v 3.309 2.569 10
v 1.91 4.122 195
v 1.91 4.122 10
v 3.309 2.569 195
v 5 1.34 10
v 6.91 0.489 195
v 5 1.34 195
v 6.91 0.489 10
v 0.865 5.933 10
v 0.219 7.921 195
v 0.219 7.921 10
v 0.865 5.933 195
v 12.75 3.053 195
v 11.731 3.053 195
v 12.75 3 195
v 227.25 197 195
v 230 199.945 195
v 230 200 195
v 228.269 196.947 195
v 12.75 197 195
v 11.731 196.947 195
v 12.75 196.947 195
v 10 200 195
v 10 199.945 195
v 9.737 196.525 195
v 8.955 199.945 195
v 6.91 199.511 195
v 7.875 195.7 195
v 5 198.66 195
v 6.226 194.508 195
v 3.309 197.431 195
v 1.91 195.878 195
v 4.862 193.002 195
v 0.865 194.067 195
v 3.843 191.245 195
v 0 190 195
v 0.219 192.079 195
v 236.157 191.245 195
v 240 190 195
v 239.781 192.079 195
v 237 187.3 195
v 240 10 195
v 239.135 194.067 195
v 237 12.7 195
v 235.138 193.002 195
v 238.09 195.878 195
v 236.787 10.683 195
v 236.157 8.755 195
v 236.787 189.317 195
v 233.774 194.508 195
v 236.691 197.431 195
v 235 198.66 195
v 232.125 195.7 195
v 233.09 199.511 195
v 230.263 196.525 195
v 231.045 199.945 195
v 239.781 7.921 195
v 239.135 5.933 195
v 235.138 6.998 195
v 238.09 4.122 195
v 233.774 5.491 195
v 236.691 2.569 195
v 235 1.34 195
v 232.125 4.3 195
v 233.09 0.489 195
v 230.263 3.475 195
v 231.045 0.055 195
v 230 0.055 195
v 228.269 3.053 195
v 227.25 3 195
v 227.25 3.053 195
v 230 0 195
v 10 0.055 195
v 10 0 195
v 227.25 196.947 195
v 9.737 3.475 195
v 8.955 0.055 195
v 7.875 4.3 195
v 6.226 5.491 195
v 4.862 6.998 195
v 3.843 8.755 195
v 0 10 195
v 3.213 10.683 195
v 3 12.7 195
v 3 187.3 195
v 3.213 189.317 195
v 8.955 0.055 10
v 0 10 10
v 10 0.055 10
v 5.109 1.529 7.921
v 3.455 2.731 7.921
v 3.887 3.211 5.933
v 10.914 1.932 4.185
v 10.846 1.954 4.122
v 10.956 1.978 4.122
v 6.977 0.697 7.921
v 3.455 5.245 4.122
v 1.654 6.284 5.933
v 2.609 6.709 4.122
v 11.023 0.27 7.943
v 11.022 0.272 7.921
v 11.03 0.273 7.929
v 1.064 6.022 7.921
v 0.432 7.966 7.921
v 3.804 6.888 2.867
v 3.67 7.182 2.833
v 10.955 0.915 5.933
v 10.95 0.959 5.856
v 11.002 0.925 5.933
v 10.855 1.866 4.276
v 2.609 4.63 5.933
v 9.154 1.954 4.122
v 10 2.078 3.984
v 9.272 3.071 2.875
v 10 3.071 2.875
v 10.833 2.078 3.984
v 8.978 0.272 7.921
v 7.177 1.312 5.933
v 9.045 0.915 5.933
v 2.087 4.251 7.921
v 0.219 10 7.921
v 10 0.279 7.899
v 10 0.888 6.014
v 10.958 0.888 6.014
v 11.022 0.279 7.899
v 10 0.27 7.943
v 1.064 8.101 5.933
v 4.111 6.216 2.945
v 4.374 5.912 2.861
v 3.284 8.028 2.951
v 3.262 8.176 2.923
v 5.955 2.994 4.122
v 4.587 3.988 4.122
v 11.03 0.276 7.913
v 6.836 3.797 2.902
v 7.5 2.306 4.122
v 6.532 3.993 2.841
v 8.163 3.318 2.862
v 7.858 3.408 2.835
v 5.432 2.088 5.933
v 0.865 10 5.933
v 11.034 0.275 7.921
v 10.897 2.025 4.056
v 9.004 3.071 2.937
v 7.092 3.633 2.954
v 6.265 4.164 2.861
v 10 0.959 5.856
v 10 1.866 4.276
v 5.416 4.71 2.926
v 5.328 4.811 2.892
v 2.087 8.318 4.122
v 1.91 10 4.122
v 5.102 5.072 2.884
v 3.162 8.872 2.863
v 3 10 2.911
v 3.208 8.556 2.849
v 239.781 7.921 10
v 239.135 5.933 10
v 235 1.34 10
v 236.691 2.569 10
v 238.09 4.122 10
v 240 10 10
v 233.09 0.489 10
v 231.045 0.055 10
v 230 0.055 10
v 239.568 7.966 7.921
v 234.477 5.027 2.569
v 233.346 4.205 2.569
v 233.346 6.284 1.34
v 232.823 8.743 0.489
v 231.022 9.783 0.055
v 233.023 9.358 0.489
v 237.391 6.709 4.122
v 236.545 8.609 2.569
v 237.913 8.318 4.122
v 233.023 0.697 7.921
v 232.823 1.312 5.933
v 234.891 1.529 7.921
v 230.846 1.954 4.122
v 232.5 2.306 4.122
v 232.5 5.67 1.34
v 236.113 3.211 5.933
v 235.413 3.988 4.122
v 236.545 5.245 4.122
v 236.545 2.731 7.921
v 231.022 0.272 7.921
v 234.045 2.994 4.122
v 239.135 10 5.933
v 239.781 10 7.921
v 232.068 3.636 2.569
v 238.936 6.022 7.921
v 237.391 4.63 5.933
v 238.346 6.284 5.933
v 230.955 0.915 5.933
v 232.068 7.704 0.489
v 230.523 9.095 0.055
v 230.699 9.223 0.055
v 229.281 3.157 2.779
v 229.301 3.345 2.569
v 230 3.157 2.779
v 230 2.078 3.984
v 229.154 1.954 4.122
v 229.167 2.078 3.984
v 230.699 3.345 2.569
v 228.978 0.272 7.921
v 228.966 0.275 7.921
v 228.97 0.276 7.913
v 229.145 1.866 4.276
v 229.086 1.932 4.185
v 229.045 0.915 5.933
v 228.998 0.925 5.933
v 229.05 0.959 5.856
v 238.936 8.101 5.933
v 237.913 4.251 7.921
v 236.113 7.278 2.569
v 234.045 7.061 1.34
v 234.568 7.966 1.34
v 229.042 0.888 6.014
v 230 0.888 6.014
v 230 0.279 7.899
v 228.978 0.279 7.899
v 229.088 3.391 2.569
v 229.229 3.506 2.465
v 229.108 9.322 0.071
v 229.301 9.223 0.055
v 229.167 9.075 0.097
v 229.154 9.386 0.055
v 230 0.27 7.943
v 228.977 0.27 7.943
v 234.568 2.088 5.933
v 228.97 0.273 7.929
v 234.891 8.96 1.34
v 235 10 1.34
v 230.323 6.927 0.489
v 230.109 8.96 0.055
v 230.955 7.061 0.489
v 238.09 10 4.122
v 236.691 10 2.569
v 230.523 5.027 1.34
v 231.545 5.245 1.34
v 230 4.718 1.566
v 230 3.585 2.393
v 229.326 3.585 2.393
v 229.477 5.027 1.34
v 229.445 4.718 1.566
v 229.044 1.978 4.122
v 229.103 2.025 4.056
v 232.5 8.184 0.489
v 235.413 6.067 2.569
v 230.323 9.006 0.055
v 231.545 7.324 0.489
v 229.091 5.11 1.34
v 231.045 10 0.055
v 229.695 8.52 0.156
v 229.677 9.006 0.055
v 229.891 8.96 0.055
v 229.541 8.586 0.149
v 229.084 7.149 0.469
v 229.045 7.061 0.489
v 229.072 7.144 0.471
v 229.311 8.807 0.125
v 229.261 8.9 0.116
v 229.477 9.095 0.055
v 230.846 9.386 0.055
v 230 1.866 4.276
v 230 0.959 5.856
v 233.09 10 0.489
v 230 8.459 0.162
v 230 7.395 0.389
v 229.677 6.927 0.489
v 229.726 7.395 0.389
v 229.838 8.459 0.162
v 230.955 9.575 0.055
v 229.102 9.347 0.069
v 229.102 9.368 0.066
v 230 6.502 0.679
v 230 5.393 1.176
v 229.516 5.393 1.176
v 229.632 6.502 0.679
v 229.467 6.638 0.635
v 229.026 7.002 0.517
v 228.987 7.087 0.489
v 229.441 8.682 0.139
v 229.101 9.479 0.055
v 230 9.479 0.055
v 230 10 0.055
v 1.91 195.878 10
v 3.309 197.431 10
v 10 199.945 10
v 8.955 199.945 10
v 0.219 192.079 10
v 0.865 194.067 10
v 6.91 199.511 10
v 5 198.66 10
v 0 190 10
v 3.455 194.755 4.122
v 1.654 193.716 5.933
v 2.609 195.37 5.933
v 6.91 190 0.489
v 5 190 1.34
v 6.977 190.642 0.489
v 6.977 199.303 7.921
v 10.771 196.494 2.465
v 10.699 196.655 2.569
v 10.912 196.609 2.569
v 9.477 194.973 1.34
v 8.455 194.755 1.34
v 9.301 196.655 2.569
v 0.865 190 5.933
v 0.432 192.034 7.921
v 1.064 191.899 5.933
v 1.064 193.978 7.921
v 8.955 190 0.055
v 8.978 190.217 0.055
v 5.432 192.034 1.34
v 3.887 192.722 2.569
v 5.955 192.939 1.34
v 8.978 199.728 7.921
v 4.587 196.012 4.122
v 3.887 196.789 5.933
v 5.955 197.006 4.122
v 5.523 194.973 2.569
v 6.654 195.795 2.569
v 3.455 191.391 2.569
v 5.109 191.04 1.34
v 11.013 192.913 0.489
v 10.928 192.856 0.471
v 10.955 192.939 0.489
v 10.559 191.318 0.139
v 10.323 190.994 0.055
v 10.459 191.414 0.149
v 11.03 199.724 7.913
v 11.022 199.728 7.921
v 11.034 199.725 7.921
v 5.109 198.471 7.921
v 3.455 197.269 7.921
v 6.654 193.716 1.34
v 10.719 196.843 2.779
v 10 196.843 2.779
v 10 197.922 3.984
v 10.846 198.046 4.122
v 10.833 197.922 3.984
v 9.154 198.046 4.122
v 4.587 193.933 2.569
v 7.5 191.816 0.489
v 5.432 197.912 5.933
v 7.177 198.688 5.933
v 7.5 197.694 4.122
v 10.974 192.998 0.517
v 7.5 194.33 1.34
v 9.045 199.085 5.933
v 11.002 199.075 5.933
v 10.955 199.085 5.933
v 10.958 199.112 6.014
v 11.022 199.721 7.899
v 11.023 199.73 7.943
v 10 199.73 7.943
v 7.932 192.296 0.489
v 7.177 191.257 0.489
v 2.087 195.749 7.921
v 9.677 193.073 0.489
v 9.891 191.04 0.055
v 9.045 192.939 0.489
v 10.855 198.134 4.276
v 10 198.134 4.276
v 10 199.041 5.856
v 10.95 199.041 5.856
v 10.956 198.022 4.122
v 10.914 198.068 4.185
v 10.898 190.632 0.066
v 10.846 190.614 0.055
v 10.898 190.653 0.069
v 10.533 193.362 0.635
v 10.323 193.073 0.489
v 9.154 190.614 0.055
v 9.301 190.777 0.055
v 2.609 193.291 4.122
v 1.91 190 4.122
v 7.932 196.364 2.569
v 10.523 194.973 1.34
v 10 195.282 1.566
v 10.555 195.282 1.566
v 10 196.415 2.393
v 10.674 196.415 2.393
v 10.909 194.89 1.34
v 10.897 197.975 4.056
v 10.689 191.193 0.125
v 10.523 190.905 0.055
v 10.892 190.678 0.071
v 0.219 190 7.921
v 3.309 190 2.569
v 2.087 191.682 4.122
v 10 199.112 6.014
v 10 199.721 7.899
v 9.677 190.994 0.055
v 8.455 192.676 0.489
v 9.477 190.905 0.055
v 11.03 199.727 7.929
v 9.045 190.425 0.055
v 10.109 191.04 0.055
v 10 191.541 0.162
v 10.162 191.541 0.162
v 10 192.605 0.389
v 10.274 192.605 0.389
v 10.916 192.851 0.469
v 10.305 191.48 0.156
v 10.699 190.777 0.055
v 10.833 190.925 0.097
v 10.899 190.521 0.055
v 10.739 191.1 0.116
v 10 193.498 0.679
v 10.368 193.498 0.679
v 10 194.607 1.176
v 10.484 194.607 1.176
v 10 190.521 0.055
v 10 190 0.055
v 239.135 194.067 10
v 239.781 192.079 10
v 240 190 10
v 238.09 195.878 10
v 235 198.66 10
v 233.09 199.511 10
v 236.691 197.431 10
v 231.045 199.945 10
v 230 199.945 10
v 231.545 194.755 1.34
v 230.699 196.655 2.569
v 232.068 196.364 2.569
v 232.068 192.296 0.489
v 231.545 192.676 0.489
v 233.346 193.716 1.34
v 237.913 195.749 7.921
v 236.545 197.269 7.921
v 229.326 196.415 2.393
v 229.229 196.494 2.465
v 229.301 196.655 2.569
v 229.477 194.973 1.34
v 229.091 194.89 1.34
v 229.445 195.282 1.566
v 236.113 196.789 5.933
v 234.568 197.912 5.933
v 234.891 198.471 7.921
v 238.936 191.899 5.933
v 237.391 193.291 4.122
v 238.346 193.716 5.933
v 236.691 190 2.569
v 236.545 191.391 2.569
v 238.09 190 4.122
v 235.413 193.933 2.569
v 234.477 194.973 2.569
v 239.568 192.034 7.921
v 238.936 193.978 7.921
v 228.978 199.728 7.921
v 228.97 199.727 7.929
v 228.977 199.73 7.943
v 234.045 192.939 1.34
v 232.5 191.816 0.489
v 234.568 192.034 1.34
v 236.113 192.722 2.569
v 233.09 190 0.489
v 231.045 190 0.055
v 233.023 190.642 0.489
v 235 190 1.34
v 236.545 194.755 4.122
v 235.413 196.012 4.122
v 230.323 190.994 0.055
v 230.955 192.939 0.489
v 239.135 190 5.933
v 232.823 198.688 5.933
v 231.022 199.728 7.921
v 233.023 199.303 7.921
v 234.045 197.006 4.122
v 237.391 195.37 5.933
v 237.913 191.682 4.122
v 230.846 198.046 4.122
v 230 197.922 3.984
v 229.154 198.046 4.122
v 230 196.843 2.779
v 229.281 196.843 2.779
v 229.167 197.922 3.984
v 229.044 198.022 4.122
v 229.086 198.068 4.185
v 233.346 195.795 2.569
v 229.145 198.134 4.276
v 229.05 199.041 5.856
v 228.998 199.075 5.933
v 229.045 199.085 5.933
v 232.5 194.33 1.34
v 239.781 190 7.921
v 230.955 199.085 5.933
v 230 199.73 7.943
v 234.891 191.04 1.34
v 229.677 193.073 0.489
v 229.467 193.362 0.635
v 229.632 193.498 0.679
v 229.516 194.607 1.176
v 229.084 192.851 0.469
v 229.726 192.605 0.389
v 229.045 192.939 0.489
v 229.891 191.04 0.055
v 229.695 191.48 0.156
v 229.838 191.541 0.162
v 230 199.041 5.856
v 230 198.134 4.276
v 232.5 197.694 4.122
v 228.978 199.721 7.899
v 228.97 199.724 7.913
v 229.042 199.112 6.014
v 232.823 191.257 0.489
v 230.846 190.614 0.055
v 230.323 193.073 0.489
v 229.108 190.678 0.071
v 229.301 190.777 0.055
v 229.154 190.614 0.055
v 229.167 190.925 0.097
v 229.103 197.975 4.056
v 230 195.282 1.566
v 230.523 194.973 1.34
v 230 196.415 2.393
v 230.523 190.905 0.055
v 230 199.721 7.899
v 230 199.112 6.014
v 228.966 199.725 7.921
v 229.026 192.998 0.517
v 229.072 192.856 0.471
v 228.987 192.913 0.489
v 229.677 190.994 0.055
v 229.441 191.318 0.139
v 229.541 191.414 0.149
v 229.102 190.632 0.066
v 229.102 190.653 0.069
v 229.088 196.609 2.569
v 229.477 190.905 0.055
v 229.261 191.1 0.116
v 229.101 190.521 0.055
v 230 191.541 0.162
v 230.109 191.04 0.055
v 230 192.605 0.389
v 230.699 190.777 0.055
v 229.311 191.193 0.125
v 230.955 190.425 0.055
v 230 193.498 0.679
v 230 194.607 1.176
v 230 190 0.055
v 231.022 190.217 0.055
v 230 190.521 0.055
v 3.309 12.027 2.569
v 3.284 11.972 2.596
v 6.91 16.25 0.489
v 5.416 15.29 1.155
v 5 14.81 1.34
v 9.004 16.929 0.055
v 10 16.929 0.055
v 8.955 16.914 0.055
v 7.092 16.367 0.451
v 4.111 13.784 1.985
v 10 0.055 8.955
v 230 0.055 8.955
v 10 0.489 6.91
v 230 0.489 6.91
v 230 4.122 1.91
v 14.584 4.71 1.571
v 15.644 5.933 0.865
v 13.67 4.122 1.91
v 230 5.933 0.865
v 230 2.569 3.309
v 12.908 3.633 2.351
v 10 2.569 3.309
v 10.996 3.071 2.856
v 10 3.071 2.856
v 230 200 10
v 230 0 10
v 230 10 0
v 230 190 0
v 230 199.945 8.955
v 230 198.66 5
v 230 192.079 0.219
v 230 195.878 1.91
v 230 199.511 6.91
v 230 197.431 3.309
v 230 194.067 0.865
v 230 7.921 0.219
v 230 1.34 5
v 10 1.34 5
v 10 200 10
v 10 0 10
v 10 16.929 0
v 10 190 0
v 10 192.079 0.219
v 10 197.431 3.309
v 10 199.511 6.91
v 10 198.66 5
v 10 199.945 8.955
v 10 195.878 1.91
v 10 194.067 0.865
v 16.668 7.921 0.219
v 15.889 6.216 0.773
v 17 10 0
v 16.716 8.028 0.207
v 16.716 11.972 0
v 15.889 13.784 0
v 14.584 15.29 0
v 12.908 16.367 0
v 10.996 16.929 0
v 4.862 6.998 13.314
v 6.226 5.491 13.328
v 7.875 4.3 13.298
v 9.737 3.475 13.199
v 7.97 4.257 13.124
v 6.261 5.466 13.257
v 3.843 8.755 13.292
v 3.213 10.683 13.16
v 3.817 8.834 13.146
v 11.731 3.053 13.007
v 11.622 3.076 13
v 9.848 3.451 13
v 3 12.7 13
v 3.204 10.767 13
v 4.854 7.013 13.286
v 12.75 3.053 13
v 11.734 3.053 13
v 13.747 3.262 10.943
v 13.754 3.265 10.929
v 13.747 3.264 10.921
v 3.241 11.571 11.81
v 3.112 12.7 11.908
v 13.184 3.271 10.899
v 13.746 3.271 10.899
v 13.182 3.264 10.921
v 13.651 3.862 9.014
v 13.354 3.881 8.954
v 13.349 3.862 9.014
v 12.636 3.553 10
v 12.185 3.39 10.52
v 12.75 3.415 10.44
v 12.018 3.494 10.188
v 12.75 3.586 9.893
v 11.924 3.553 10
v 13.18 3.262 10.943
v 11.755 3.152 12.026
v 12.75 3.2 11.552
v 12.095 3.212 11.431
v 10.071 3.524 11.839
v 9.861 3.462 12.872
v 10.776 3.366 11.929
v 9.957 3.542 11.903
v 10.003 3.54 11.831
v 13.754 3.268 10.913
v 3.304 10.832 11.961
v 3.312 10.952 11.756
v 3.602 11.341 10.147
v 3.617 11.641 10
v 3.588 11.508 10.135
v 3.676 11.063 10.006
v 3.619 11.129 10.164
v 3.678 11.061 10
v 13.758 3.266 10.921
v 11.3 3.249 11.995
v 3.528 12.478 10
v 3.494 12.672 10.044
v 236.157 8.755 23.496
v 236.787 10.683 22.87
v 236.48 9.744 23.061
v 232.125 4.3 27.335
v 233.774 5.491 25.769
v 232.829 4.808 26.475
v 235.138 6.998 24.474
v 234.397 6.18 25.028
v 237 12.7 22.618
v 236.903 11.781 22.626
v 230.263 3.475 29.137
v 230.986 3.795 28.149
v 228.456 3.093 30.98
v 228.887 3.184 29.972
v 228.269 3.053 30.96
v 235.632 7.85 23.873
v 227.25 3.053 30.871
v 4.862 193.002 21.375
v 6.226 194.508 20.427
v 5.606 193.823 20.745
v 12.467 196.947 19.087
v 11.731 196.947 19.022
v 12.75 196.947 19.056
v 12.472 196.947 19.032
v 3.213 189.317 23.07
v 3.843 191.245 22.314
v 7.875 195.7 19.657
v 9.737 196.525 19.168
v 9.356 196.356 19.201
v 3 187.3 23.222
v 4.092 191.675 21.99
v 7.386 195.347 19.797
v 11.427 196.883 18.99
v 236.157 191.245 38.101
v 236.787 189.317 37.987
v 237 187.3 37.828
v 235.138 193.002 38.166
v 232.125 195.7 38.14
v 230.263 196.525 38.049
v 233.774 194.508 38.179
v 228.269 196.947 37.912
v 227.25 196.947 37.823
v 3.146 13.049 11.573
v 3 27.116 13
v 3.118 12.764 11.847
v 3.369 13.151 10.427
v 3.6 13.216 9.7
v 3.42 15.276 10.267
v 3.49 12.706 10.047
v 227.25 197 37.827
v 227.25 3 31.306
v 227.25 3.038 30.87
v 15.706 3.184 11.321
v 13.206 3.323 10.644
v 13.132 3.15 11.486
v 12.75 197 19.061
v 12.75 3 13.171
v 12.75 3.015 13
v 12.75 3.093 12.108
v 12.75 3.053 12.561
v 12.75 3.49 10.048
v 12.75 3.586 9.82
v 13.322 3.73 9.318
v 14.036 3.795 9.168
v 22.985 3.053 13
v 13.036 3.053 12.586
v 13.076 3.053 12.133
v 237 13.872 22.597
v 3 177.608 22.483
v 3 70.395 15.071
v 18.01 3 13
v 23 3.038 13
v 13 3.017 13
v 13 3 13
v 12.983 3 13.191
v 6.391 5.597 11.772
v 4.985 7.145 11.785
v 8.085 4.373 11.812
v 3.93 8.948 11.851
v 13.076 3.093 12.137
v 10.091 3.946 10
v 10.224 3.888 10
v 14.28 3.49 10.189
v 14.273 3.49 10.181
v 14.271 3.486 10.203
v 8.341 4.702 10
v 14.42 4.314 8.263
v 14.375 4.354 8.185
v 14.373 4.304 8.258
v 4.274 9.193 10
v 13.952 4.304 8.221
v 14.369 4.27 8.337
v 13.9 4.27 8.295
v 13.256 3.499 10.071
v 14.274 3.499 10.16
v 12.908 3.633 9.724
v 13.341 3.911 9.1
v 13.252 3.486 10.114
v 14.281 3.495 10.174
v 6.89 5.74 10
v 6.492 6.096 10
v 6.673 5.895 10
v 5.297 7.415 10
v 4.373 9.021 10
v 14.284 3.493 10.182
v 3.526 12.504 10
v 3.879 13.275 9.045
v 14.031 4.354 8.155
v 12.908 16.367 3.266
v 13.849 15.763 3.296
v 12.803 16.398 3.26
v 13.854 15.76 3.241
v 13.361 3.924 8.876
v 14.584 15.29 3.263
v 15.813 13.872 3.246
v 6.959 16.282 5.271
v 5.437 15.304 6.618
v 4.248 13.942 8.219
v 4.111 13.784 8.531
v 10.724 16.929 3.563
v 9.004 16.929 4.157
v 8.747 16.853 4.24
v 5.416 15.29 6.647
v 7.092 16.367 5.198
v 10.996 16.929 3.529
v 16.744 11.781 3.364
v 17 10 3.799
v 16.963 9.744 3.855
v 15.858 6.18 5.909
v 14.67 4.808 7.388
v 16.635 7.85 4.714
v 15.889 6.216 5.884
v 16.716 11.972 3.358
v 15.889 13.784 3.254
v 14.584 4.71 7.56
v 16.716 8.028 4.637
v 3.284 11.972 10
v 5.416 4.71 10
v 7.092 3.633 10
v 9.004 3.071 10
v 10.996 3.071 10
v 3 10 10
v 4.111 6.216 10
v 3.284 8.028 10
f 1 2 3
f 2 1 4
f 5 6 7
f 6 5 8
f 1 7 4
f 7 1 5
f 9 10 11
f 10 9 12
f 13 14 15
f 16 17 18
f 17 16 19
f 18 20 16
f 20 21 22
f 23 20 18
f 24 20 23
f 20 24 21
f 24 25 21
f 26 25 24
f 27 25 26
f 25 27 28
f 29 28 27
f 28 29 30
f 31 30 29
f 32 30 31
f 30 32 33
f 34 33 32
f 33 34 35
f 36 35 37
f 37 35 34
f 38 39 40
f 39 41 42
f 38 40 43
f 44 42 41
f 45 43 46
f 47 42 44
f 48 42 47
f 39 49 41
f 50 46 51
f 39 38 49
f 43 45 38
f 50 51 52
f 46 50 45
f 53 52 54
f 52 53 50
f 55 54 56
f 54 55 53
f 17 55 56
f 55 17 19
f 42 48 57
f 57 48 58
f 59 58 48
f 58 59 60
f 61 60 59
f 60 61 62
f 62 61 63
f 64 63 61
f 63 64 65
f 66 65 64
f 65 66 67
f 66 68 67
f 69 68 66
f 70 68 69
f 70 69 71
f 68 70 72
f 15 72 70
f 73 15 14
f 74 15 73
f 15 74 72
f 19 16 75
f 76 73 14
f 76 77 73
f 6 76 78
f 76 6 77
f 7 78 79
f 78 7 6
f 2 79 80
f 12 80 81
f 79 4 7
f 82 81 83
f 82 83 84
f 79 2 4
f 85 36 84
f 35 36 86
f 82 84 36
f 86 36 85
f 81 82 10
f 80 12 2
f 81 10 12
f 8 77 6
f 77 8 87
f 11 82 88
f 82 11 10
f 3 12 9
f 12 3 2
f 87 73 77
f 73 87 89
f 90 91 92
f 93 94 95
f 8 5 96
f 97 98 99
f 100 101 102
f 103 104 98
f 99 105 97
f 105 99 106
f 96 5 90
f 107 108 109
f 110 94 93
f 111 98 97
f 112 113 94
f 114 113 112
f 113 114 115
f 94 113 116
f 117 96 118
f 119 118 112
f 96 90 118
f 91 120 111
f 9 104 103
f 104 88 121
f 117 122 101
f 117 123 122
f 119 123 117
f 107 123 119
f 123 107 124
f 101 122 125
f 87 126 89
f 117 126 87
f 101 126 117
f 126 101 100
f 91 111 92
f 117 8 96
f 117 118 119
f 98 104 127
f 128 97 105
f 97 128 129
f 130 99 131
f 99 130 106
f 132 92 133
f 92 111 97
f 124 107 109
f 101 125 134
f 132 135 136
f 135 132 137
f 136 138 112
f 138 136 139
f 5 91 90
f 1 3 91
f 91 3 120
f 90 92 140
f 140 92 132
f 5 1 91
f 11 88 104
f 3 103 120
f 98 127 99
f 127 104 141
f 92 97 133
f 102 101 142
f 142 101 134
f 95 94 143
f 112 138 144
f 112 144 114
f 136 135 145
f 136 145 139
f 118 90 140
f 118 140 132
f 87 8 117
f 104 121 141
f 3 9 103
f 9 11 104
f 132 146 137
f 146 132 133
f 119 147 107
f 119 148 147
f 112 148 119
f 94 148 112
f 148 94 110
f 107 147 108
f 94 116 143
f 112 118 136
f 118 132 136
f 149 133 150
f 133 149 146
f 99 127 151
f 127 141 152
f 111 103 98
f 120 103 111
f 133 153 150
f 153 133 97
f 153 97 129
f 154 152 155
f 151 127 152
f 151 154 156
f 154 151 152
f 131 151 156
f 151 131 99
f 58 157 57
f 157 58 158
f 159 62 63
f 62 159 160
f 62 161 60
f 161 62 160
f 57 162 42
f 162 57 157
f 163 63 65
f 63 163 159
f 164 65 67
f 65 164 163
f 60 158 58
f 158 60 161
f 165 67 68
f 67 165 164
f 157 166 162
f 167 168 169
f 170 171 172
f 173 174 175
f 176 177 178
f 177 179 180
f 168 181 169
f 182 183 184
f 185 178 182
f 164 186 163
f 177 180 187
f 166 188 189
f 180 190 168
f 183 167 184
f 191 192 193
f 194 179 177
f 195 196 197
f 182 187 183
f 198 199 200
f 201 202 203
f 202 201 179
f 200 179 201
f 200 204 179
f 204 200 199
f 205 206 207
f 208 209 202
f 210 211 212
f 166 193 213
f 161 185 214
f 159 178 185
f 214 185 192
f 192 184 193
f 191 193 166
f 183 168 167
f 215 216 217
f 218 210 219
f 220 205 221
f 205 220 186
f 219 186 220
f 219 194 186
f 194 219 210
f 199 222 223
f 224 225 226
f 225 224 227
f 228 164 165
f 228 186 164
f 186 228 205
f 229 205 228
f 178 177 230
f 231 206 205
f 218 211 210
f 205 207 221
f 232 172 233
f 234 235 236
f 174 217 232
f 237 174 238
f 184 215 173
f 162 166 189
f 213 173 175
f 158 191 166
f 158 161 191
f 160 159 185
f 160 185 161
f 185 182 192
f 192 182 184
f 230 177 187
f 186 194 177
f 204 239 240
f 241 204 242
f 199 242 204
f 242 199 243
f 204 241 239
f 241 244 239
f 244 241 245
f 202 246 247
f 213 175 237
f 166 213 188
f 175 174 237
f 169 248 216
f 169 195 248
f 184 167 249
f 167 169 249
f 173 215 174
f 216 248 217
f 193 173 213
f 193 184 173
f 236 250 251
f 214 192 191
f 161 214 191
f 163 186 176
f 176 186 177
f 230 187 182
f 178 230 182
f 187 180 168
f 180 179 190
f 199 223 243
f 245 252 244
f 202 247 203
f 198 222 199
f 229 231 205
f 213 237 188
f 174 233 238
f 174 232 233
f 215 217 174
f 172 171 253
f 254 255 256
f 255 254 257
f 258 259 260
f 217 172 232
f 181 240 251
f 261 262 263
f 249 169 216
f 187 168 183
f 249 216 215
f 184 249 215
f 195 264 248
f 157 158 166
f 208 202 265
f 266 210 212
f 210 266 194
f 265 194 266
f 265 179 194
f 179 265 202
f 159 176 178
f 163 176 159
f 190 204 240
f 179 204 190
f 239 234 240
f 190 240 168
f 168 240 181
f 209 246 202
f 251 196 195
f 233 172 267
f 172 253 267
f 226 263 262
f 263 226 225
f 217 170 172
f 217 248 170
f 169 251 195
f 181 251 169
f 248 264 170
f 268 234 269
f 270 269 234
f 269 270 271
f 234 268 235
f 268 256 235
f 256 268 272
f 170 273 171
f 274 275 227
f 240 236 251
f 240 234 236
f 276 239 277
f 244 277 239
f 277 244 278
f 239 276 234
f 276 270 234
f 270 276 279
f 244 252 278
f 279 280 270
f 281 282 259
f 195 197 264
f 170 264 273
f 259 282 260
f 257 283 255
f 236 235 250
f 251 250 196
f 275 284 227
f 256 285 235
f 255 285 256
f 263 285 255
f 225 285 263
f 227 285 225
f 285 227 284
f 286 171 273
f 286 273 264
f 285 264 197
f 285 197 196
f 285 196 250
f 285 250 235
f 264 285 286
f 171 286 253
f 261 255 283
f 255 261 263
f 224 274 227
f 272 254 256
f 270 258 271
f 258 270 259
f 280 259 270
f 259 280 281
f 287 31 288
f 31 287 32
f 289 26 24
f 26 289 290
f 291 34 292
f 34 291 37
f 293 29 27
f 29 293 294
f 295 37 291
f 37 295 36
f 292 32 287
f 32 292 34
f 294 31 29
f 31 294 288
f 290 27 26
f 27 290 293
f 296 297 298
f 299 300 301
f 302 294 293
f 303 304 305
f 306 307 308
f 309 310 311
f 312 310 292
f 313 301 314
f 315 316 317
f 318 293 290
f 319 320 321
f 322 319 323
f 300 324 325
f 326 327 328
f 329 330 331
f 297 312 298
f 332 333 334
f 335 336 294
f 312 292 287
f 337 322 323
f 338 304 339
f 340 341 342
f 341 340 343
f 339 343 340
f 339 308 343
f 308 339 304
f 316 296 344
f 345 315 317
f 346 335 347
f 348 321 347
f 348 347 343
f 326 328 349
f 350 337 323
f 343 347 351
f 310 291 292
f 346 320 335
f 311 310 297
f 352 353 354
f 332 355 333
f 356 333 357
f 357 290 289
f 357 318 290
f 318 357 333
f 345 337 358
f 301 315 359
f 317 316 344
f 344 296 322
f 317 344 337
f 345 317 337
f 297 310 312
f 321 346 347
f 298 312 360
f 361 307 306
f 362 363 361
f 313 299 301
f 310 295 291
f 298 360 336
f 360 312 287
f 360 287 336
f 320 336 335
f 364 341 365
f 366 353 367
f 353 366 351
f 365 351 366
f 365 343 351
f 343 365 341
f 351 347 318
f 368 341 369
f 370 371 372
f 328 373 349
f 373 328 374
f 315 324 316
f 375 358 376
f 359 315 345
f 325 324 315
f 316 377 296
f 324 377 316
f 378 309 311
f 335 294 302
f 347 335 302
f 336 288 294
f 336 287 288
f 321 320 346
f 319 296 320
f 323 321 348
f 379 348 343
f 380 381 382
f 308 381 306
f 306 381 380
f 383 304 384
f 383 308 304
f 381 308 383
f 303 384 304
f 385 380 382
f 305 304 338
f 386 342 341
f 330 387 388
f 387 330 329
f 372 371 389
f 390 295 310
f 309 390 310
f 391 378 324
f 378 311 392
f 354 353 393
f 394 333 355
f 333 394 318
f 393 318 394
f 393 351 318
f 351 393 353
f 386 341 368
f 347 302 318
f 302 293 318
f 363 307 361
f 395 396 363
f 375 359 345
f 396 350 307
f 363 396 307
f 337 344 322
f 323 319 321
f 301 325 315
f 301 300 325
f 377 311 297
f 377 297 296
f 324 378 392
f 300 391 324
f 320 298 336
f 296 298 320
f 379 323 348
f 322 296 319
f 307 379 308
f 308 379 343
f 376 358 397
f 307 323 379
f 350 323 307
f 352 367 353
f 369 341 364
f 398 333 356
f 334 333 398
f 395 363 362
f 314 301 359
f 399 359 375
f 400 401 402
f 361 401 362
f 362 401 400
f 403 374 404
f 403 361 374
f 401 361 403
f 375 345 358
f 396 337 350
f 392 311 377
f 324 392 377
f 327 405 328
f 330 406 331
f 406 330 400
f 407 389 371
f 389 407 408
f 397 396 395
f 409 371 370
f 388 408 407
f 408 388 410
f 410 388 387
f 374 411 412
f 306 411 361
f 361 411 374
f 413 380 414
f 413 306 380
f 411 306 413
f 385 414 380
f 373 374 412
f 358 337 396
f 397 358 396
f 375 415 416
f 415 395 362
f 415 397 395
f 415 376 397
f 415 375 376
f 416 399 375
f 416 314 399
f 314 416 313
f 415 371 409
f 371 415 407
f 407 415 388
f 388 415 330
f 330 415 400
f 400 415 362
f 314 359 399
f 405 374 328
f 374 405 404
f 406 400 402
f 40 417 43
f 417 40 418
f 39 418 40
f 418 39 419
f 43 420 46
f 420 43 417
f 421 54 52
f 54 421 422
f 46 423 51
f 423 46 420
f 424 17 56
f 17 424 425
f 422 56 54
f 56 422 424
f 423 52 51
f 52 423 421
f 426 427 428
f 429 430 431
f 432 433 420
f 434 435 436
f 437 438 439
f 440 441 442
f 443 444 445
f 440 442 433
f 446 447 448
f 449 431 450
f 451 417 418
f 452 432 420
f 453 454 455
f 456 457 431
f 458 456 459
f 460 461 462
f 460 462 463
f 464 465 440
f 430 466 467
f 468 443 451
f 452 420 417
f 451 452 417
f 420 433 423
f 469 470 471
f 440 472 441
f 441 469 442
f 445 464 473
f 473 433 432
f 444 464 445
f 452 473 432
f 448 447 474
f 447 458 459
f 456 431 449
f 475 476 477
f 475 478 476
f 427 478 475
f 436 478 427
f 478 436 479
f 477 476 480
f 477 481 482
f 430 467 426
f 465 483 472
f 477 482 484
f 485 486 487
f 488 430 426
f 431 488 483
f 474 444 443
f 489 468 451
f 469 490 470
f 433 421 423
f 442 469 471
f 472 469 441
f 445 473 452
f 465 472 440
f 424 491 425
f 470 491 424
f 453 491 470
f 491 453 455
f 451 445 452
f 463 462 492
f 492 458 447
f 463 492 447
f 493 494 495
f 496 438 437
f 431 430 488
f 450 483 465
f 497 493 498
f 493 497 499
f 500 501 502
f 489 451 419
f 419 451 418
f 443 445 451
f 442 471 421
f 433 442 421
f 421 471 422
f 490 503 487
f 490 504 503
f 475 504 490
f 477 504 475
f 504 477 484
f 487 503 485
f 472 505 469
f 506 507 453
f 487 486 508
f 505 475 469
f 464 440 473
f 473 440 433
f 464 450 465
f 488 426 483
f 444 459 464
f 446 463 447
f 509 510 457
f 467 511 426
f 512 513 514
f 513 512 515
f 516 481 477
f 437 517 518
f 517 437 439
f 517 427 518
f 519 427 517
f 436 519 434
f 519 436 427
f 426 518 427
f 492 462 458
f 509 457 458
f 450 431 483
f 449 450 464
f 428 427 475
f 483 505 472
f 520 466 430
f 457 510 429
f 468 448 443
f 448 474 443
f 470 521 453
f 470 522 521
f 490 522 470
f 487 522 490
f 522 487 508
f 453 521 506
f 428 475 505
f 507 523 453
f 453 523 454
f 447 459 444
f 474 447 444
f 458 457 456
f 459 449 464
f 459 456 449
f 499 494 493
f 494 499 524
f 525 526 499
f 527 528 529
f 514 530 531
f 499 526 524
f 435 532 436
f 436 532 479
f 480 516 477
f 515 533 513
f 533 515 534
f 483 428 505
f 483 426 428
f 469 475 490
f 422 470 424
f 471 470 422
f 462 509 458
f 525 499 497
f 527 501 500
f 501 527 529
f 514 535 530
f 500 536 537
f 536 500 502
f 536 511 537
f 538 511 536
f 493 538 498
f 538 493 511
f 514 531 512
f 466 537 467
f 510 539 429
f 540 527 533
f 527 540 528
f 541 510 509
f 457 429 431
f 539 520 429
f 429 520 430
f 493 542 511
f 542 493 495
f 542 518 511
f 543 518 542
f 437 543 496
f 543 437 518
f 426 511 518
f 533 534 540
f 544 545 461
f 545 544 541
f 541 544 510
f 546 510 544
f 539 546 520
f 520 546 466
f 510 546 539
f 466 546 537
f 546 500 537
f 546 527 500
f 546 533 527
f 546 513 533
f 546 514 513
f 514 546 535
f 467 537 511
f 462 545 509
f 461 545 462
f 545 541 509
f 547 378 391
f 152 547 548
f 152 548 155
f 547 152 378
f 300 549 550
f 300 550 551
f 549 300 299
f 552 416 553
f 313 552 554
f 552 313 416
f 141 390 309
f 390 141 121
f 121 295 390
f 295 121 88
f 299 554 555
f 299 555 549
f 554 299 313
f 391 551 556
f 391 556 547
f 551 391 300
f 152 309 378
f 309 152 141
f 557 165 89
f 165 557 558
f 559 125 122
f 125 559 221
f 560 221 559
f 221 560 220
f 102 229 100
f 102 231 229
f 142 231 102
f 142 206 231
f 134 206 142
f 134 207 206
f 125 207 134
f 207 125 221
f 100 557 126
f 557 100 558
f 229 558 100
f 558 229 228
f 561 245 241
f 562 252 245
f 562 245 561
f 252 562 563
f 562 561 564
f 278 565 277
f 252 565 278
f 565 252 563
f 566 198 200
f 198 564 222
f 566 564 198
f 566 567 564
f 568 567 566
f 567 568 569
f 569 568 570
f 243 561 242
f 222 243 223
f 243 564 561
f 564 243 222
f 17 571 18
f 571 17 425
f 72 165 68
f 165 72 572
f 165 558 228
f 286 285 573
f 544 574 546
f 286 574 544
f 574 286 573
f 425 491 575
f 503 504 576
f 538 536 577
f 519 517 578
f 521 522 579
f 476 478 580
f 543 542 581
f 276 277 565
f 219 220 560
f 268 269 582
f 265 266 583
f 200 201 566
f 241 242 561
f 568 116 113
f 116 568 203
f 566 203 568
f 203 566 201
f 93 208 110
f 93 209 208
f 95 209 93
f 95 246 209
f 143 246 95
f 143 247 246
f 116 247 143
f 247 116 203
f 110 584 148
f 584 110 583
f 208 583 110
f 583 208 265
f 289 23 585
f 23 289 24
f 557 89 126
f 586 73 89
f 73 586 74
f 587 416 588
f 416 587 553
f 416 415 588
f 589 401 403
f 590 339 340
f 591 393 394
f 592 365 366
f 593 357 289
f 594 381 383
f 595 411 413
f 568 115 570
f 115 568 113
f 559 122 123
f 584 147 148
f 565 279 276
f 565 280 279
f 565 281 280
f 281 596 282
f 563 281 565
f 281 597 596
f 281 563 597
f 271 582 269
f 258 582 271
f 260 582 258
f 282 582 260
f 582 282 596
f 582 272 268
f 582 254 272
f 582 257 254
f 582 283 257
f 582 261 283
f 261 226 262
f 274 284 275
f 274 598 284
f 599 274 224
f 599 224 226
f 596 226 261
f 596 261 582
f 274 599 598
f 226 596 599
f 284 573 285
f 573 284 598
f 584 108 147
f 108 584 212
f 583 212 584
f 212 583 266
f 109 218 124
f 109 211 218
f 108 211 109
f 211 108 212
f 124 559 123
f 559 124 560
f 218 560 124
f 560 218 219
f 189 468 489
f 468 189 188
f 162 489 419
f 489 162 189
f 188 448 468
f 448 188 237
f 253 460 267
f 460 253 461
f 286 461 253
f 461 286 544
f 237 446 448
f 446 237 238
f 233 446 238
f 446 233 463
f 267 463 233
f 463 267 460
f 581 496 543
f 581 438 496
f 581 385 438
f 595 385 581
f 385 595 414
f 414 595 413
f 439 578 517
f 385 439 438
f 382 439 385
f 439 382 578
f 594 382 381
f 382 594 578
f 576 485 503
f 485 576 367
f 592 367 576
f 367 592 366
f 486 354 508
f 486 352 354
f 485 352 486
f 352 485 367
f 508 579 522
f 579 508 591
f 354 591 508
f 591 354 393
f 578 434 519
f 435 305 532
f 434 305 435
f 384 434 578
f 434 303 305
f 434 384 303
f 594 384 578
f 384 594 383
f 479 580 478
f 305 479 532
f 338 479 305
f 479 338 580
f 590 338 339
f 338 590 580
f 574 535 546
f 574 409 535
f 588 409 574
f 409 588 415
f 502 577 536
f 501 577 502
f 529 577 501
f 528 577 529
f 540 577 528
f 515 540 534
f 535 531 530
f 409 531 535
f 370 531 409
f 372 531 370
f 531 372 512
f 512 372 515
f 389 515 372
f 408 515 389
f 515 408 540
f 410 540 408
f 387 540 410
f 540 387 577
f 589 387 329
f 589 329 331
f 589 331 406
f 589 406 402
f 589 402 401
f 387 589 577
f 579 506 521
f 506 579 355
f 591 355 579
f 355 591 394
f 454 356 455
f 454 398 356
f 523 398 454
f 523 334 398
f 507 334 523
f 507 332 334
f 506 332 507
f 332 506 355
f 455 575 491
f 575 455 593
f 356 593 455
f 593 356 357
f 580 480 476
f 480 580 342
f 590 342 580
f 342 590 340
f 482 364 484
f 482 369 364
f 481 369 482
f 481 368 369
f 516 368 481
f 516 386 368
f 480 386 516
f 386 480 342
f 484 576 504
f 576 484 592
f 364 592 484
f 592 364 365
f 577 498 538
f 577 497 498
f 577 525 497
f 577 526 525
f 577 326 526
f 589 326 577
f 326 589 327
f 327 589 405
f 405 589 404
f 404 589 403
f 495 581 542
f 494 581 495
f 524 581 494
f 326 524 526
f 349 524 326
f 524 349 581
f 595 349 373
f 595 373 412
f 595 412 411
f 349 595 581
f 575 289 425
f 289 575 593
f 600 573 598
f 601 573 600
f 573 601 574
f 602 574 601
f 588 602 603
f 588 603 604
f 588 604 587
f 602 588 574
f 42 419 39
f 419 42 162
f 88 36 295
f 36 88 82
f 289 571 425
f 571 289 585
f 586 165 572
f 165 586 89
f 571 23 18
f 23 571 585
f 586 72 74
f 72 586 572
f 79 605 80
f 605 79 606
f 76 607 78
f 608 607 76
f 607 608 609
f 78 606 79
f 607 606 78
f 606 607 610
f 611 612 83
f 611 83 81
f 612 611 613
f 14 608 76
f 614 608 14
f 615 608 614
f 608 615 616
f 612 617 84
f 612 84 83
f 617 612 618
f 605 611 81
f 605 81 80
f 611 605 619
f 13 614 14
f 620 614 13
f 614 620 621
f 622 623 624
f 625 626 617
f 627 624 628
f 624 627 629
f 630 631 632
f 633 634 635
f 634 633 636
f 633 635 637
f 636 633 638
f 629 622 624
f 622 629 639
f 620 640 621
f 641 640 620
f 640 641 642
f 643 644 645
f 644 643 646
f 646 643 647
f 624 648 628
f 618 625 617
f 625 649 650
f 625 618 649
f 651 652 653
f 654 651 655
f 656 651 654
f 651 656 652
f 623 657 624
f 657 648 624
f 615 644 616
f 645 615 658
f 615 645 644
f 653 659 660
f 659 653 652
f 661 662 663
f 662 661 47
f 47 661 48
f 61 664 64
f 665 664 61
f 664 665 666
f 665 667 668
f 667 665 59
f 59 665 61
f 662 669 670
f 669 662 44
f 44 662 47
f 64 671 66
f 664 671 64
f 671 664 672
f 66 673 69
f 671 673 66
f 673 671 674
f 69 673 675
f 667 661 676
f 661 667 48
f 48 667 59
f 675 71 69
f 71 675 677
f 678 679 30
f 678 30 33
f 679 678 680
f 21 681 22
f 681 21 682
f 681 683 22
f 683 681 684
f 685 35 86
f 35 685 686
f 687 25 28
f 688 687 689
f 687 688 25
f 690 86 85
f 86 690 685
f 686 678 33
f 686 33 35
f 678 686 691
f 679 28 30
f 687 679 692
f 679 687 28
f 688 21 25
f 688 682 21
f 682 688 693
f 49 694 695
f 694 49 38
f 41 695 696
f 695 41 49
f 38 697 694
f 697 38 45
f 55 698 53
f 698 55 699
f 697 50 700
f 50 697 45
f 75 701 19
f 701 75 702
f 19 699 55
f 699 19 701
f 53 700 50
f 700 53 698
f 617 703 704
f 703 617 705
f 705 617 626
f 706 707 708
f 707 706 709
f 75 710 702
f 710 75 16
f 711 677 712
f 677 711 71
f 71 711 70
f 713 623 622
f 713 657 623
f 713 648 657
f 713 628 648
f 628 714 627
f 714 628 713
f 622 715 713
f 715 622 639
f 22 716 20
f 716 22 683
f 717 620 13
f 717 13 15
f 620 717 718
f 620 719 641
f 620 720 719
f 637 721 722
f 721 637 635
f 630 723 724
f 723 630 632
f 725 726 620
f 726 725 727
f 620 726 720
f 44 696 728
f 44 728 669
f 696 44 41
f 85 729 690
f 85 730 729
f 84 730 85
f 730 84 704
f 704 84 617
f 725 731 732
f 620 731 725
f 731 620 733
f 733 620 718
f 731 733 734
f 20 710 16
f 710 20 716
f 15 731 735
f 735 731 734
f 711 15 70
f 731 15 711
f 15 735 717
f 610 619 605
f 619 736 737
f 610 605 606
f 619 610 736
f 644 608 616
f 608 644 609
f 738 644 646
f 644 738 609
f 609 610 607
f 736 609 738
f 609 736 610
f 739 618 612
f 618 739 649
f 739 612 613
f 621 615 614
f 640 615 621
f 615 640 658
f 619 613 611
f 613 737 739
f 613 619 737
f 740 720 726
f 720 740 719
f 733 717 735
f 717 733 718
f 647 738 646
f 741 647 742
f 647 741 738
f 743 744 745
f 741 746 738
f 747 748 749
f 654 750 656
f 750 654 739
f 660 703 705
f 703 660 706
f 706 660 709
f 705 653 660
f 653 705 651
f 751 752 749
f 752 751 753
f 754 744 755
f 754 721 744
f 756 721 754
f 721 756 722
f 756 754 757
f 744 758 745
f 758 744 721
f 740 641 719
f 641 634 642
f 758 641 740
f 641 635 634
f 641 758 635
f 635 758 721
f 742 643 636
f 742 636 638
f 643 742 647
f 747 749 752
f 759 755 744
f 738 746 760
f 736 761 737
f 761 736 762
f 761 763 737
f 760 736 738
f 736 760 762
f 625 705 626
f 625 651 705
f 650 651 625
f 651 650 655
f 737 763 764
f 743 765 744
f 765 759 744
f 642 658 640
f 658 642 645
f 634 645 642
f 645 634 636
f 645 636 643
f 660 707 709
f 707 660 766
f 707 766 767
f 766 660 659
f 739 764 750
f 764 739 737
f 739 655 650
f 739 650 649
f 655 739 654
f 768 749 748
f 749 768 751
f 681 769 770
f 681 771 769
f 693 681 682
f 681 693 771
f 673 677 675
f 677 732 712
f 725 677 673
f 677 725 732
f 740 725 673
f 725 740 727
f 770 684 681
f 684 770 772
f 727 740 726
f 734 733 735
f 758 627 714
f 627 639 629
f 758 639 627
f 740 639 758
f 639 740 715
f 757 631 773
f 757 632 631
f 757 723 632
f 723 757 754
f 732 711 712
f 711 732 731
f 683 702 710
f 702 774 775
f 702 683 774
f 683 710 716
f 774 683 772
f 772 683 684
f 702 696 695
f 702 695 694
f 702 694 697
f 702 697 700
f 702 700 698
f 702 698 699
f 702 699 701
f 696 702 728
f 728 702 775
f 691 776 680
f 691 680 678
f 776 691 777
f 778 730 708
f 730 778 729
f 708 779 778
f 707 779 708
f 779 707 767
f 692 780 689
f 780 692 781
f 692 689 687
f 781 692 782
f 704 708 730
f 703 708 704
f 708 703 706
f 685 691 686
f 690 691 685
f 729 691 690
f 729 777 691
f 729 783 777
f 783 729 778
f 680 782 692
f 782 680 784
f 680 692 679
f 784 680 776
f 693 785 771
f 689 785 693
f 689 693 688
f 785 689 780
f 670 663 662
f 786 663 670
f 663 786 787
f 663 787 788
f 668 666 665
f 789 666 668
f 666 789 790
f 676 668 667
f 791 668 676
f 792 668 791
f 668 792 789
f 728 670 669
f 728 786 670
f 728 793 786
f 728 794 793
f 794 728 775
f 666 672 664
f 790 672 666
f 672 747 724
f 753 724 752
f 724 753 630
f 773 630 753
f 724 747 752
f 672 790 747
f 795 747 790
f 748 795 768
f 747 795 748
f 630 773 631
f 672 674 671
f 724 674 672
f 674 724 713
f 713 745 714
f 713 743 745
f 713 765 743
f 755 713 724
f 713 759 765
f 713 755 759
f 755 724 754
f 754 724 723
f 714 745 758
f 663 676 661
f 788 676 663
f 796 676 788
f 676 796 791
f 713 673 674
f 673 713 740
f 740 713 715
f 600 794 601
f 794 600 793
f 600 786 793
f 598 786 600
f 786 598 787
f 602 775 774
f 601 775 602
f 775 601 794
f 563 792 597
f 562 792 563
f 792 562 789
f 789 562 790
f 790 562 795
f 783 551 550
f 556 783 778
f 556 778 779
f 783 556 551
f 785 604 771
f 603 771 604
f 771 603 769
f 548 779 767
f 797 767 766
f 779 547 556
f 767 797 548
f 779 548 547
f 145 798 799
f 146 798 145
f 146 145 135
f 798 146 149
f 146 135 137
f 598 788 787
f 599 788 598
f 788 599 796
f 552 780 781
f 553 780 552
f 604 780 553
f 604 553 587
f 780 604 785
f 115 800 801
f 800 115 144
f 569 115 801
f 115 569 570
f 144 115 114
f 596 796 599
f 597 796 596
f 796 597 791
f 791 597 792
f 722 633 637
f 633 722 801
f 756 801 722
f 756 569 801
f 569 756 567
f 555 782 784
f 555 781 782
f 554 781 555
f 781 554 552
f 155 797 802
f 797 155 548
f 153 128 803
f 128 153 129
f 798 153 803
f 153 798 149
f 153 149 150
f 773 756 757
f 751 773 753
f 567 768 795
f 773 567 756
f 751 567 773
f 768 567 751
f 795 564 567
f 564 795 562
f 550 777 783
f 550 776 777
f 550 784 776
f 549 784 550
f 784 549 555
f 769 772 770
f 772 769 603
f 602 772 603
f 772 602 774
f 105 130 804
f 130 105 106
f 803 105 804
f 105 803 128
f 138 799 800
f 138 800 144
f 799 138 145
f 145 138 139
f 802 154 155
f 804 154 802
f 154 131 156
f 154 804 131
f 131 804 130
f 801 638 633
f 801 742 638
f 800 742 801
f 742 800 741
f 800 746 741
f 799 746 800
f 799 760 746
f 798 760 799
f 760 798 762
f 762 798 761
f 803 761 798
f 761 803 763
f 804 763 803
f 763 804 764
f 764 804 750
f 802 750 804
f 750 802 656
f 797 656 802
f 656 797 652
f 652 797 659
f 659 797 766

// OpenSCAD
radius = 10;
height = 195;
x = 240;
y = 200;
angle = 5;
//$fn=64;

module box() {
    translate([radius, radius, radius]) corner();
    translate([x - radius, radius, radius]) corner();
    translate([radius, y - radius, radius]) corner();
    translate([x - radius, y - radius, radius]) corner();

    translate([radius, radius, radius]) rotate([- 90, 0, 0]) cylinder(r = radius, h = y - 2 * radius);
    translate([radius, radius, radius]) rotate([0, 90, 0]) cylinder(r = radius, h = x - 2 * radius);
    translate([x - radius, radius, radius]) rotate([- 90, 0, 0]) cylinder(r = radius, h = y - 2 * radius);
    translate([radius, y - radius, radius]) rotate([0, 90, 0]) cylinder(r = radius, h = x - 2 * radius);

    translate([radius, radius, 0]) cube([x - 2 * radius, y - 2 * radius, height]);
    translate([0, radius, radius]) cube([x, y - 2 * radius, height - radius]);
    translate([radius, 0, radius]) cube([x - 2 * radius, y, height - radius]);
}

module corner() {
    cylinder(r = radius, h = height - radius);
    sphere(r = radius);
}

module inner() {
    intersection() {
        translate([3, 3, 3]) resize(([x - 6, y - 6, height]))  box();
        union() {
            inner1();}
    }

}

module inner1() {
    translate([radius + 3, radius + 3, radius + 3]) rotate([angle, - angle, 0]) union() {
        yd = sin(angle) * y;
        xd = sin(angle) * x;
        x = xd + x + 6;
        y = yd + y + 6;
        corner();
        translate([x - 2 * radius - 6, 0, 0]) corner();
        translate([0, y - 2 * radius - 6, 0]) corner();
        translate([x - 2 * radius - 6, y - 2 * radius - 6, 0]) corner();

        translate([- radius, 0, 0,]) cube([x - 2 * radius - 6, y, height]);
        translate([0, - radius, 0,]) cube([x, y - 2 * radius - 6, height]);
        translate([0, 0, - radius,]) cube([x - 2 * radius - 6, y - 2 * radius - 6, height]);

        rotate([- 90, 0, 0]) cylinder(r = radius, h = y - 2 * radius);
        rotate([0, 90, 0]) cylinder(r = radius, h = x - 2 * radius - 6);
        translate([x - 2 * radius - 3, 0, 0]) rotate([- 90, 0, 0]) cylinder(r = radius, h = y - 2 * radius - 6);
        translate([0, y - 2 * radius - 3, 0]) rotate([0, 90, 0]) cylinder(r = radius, h = x - 2 * radius - 6);

    }
}

module main() {
    difference() {
        box();
        inner();
        translate([radius, radius, 0])  cylinder(r = radius-3, h = radius);
    }
}

main();
